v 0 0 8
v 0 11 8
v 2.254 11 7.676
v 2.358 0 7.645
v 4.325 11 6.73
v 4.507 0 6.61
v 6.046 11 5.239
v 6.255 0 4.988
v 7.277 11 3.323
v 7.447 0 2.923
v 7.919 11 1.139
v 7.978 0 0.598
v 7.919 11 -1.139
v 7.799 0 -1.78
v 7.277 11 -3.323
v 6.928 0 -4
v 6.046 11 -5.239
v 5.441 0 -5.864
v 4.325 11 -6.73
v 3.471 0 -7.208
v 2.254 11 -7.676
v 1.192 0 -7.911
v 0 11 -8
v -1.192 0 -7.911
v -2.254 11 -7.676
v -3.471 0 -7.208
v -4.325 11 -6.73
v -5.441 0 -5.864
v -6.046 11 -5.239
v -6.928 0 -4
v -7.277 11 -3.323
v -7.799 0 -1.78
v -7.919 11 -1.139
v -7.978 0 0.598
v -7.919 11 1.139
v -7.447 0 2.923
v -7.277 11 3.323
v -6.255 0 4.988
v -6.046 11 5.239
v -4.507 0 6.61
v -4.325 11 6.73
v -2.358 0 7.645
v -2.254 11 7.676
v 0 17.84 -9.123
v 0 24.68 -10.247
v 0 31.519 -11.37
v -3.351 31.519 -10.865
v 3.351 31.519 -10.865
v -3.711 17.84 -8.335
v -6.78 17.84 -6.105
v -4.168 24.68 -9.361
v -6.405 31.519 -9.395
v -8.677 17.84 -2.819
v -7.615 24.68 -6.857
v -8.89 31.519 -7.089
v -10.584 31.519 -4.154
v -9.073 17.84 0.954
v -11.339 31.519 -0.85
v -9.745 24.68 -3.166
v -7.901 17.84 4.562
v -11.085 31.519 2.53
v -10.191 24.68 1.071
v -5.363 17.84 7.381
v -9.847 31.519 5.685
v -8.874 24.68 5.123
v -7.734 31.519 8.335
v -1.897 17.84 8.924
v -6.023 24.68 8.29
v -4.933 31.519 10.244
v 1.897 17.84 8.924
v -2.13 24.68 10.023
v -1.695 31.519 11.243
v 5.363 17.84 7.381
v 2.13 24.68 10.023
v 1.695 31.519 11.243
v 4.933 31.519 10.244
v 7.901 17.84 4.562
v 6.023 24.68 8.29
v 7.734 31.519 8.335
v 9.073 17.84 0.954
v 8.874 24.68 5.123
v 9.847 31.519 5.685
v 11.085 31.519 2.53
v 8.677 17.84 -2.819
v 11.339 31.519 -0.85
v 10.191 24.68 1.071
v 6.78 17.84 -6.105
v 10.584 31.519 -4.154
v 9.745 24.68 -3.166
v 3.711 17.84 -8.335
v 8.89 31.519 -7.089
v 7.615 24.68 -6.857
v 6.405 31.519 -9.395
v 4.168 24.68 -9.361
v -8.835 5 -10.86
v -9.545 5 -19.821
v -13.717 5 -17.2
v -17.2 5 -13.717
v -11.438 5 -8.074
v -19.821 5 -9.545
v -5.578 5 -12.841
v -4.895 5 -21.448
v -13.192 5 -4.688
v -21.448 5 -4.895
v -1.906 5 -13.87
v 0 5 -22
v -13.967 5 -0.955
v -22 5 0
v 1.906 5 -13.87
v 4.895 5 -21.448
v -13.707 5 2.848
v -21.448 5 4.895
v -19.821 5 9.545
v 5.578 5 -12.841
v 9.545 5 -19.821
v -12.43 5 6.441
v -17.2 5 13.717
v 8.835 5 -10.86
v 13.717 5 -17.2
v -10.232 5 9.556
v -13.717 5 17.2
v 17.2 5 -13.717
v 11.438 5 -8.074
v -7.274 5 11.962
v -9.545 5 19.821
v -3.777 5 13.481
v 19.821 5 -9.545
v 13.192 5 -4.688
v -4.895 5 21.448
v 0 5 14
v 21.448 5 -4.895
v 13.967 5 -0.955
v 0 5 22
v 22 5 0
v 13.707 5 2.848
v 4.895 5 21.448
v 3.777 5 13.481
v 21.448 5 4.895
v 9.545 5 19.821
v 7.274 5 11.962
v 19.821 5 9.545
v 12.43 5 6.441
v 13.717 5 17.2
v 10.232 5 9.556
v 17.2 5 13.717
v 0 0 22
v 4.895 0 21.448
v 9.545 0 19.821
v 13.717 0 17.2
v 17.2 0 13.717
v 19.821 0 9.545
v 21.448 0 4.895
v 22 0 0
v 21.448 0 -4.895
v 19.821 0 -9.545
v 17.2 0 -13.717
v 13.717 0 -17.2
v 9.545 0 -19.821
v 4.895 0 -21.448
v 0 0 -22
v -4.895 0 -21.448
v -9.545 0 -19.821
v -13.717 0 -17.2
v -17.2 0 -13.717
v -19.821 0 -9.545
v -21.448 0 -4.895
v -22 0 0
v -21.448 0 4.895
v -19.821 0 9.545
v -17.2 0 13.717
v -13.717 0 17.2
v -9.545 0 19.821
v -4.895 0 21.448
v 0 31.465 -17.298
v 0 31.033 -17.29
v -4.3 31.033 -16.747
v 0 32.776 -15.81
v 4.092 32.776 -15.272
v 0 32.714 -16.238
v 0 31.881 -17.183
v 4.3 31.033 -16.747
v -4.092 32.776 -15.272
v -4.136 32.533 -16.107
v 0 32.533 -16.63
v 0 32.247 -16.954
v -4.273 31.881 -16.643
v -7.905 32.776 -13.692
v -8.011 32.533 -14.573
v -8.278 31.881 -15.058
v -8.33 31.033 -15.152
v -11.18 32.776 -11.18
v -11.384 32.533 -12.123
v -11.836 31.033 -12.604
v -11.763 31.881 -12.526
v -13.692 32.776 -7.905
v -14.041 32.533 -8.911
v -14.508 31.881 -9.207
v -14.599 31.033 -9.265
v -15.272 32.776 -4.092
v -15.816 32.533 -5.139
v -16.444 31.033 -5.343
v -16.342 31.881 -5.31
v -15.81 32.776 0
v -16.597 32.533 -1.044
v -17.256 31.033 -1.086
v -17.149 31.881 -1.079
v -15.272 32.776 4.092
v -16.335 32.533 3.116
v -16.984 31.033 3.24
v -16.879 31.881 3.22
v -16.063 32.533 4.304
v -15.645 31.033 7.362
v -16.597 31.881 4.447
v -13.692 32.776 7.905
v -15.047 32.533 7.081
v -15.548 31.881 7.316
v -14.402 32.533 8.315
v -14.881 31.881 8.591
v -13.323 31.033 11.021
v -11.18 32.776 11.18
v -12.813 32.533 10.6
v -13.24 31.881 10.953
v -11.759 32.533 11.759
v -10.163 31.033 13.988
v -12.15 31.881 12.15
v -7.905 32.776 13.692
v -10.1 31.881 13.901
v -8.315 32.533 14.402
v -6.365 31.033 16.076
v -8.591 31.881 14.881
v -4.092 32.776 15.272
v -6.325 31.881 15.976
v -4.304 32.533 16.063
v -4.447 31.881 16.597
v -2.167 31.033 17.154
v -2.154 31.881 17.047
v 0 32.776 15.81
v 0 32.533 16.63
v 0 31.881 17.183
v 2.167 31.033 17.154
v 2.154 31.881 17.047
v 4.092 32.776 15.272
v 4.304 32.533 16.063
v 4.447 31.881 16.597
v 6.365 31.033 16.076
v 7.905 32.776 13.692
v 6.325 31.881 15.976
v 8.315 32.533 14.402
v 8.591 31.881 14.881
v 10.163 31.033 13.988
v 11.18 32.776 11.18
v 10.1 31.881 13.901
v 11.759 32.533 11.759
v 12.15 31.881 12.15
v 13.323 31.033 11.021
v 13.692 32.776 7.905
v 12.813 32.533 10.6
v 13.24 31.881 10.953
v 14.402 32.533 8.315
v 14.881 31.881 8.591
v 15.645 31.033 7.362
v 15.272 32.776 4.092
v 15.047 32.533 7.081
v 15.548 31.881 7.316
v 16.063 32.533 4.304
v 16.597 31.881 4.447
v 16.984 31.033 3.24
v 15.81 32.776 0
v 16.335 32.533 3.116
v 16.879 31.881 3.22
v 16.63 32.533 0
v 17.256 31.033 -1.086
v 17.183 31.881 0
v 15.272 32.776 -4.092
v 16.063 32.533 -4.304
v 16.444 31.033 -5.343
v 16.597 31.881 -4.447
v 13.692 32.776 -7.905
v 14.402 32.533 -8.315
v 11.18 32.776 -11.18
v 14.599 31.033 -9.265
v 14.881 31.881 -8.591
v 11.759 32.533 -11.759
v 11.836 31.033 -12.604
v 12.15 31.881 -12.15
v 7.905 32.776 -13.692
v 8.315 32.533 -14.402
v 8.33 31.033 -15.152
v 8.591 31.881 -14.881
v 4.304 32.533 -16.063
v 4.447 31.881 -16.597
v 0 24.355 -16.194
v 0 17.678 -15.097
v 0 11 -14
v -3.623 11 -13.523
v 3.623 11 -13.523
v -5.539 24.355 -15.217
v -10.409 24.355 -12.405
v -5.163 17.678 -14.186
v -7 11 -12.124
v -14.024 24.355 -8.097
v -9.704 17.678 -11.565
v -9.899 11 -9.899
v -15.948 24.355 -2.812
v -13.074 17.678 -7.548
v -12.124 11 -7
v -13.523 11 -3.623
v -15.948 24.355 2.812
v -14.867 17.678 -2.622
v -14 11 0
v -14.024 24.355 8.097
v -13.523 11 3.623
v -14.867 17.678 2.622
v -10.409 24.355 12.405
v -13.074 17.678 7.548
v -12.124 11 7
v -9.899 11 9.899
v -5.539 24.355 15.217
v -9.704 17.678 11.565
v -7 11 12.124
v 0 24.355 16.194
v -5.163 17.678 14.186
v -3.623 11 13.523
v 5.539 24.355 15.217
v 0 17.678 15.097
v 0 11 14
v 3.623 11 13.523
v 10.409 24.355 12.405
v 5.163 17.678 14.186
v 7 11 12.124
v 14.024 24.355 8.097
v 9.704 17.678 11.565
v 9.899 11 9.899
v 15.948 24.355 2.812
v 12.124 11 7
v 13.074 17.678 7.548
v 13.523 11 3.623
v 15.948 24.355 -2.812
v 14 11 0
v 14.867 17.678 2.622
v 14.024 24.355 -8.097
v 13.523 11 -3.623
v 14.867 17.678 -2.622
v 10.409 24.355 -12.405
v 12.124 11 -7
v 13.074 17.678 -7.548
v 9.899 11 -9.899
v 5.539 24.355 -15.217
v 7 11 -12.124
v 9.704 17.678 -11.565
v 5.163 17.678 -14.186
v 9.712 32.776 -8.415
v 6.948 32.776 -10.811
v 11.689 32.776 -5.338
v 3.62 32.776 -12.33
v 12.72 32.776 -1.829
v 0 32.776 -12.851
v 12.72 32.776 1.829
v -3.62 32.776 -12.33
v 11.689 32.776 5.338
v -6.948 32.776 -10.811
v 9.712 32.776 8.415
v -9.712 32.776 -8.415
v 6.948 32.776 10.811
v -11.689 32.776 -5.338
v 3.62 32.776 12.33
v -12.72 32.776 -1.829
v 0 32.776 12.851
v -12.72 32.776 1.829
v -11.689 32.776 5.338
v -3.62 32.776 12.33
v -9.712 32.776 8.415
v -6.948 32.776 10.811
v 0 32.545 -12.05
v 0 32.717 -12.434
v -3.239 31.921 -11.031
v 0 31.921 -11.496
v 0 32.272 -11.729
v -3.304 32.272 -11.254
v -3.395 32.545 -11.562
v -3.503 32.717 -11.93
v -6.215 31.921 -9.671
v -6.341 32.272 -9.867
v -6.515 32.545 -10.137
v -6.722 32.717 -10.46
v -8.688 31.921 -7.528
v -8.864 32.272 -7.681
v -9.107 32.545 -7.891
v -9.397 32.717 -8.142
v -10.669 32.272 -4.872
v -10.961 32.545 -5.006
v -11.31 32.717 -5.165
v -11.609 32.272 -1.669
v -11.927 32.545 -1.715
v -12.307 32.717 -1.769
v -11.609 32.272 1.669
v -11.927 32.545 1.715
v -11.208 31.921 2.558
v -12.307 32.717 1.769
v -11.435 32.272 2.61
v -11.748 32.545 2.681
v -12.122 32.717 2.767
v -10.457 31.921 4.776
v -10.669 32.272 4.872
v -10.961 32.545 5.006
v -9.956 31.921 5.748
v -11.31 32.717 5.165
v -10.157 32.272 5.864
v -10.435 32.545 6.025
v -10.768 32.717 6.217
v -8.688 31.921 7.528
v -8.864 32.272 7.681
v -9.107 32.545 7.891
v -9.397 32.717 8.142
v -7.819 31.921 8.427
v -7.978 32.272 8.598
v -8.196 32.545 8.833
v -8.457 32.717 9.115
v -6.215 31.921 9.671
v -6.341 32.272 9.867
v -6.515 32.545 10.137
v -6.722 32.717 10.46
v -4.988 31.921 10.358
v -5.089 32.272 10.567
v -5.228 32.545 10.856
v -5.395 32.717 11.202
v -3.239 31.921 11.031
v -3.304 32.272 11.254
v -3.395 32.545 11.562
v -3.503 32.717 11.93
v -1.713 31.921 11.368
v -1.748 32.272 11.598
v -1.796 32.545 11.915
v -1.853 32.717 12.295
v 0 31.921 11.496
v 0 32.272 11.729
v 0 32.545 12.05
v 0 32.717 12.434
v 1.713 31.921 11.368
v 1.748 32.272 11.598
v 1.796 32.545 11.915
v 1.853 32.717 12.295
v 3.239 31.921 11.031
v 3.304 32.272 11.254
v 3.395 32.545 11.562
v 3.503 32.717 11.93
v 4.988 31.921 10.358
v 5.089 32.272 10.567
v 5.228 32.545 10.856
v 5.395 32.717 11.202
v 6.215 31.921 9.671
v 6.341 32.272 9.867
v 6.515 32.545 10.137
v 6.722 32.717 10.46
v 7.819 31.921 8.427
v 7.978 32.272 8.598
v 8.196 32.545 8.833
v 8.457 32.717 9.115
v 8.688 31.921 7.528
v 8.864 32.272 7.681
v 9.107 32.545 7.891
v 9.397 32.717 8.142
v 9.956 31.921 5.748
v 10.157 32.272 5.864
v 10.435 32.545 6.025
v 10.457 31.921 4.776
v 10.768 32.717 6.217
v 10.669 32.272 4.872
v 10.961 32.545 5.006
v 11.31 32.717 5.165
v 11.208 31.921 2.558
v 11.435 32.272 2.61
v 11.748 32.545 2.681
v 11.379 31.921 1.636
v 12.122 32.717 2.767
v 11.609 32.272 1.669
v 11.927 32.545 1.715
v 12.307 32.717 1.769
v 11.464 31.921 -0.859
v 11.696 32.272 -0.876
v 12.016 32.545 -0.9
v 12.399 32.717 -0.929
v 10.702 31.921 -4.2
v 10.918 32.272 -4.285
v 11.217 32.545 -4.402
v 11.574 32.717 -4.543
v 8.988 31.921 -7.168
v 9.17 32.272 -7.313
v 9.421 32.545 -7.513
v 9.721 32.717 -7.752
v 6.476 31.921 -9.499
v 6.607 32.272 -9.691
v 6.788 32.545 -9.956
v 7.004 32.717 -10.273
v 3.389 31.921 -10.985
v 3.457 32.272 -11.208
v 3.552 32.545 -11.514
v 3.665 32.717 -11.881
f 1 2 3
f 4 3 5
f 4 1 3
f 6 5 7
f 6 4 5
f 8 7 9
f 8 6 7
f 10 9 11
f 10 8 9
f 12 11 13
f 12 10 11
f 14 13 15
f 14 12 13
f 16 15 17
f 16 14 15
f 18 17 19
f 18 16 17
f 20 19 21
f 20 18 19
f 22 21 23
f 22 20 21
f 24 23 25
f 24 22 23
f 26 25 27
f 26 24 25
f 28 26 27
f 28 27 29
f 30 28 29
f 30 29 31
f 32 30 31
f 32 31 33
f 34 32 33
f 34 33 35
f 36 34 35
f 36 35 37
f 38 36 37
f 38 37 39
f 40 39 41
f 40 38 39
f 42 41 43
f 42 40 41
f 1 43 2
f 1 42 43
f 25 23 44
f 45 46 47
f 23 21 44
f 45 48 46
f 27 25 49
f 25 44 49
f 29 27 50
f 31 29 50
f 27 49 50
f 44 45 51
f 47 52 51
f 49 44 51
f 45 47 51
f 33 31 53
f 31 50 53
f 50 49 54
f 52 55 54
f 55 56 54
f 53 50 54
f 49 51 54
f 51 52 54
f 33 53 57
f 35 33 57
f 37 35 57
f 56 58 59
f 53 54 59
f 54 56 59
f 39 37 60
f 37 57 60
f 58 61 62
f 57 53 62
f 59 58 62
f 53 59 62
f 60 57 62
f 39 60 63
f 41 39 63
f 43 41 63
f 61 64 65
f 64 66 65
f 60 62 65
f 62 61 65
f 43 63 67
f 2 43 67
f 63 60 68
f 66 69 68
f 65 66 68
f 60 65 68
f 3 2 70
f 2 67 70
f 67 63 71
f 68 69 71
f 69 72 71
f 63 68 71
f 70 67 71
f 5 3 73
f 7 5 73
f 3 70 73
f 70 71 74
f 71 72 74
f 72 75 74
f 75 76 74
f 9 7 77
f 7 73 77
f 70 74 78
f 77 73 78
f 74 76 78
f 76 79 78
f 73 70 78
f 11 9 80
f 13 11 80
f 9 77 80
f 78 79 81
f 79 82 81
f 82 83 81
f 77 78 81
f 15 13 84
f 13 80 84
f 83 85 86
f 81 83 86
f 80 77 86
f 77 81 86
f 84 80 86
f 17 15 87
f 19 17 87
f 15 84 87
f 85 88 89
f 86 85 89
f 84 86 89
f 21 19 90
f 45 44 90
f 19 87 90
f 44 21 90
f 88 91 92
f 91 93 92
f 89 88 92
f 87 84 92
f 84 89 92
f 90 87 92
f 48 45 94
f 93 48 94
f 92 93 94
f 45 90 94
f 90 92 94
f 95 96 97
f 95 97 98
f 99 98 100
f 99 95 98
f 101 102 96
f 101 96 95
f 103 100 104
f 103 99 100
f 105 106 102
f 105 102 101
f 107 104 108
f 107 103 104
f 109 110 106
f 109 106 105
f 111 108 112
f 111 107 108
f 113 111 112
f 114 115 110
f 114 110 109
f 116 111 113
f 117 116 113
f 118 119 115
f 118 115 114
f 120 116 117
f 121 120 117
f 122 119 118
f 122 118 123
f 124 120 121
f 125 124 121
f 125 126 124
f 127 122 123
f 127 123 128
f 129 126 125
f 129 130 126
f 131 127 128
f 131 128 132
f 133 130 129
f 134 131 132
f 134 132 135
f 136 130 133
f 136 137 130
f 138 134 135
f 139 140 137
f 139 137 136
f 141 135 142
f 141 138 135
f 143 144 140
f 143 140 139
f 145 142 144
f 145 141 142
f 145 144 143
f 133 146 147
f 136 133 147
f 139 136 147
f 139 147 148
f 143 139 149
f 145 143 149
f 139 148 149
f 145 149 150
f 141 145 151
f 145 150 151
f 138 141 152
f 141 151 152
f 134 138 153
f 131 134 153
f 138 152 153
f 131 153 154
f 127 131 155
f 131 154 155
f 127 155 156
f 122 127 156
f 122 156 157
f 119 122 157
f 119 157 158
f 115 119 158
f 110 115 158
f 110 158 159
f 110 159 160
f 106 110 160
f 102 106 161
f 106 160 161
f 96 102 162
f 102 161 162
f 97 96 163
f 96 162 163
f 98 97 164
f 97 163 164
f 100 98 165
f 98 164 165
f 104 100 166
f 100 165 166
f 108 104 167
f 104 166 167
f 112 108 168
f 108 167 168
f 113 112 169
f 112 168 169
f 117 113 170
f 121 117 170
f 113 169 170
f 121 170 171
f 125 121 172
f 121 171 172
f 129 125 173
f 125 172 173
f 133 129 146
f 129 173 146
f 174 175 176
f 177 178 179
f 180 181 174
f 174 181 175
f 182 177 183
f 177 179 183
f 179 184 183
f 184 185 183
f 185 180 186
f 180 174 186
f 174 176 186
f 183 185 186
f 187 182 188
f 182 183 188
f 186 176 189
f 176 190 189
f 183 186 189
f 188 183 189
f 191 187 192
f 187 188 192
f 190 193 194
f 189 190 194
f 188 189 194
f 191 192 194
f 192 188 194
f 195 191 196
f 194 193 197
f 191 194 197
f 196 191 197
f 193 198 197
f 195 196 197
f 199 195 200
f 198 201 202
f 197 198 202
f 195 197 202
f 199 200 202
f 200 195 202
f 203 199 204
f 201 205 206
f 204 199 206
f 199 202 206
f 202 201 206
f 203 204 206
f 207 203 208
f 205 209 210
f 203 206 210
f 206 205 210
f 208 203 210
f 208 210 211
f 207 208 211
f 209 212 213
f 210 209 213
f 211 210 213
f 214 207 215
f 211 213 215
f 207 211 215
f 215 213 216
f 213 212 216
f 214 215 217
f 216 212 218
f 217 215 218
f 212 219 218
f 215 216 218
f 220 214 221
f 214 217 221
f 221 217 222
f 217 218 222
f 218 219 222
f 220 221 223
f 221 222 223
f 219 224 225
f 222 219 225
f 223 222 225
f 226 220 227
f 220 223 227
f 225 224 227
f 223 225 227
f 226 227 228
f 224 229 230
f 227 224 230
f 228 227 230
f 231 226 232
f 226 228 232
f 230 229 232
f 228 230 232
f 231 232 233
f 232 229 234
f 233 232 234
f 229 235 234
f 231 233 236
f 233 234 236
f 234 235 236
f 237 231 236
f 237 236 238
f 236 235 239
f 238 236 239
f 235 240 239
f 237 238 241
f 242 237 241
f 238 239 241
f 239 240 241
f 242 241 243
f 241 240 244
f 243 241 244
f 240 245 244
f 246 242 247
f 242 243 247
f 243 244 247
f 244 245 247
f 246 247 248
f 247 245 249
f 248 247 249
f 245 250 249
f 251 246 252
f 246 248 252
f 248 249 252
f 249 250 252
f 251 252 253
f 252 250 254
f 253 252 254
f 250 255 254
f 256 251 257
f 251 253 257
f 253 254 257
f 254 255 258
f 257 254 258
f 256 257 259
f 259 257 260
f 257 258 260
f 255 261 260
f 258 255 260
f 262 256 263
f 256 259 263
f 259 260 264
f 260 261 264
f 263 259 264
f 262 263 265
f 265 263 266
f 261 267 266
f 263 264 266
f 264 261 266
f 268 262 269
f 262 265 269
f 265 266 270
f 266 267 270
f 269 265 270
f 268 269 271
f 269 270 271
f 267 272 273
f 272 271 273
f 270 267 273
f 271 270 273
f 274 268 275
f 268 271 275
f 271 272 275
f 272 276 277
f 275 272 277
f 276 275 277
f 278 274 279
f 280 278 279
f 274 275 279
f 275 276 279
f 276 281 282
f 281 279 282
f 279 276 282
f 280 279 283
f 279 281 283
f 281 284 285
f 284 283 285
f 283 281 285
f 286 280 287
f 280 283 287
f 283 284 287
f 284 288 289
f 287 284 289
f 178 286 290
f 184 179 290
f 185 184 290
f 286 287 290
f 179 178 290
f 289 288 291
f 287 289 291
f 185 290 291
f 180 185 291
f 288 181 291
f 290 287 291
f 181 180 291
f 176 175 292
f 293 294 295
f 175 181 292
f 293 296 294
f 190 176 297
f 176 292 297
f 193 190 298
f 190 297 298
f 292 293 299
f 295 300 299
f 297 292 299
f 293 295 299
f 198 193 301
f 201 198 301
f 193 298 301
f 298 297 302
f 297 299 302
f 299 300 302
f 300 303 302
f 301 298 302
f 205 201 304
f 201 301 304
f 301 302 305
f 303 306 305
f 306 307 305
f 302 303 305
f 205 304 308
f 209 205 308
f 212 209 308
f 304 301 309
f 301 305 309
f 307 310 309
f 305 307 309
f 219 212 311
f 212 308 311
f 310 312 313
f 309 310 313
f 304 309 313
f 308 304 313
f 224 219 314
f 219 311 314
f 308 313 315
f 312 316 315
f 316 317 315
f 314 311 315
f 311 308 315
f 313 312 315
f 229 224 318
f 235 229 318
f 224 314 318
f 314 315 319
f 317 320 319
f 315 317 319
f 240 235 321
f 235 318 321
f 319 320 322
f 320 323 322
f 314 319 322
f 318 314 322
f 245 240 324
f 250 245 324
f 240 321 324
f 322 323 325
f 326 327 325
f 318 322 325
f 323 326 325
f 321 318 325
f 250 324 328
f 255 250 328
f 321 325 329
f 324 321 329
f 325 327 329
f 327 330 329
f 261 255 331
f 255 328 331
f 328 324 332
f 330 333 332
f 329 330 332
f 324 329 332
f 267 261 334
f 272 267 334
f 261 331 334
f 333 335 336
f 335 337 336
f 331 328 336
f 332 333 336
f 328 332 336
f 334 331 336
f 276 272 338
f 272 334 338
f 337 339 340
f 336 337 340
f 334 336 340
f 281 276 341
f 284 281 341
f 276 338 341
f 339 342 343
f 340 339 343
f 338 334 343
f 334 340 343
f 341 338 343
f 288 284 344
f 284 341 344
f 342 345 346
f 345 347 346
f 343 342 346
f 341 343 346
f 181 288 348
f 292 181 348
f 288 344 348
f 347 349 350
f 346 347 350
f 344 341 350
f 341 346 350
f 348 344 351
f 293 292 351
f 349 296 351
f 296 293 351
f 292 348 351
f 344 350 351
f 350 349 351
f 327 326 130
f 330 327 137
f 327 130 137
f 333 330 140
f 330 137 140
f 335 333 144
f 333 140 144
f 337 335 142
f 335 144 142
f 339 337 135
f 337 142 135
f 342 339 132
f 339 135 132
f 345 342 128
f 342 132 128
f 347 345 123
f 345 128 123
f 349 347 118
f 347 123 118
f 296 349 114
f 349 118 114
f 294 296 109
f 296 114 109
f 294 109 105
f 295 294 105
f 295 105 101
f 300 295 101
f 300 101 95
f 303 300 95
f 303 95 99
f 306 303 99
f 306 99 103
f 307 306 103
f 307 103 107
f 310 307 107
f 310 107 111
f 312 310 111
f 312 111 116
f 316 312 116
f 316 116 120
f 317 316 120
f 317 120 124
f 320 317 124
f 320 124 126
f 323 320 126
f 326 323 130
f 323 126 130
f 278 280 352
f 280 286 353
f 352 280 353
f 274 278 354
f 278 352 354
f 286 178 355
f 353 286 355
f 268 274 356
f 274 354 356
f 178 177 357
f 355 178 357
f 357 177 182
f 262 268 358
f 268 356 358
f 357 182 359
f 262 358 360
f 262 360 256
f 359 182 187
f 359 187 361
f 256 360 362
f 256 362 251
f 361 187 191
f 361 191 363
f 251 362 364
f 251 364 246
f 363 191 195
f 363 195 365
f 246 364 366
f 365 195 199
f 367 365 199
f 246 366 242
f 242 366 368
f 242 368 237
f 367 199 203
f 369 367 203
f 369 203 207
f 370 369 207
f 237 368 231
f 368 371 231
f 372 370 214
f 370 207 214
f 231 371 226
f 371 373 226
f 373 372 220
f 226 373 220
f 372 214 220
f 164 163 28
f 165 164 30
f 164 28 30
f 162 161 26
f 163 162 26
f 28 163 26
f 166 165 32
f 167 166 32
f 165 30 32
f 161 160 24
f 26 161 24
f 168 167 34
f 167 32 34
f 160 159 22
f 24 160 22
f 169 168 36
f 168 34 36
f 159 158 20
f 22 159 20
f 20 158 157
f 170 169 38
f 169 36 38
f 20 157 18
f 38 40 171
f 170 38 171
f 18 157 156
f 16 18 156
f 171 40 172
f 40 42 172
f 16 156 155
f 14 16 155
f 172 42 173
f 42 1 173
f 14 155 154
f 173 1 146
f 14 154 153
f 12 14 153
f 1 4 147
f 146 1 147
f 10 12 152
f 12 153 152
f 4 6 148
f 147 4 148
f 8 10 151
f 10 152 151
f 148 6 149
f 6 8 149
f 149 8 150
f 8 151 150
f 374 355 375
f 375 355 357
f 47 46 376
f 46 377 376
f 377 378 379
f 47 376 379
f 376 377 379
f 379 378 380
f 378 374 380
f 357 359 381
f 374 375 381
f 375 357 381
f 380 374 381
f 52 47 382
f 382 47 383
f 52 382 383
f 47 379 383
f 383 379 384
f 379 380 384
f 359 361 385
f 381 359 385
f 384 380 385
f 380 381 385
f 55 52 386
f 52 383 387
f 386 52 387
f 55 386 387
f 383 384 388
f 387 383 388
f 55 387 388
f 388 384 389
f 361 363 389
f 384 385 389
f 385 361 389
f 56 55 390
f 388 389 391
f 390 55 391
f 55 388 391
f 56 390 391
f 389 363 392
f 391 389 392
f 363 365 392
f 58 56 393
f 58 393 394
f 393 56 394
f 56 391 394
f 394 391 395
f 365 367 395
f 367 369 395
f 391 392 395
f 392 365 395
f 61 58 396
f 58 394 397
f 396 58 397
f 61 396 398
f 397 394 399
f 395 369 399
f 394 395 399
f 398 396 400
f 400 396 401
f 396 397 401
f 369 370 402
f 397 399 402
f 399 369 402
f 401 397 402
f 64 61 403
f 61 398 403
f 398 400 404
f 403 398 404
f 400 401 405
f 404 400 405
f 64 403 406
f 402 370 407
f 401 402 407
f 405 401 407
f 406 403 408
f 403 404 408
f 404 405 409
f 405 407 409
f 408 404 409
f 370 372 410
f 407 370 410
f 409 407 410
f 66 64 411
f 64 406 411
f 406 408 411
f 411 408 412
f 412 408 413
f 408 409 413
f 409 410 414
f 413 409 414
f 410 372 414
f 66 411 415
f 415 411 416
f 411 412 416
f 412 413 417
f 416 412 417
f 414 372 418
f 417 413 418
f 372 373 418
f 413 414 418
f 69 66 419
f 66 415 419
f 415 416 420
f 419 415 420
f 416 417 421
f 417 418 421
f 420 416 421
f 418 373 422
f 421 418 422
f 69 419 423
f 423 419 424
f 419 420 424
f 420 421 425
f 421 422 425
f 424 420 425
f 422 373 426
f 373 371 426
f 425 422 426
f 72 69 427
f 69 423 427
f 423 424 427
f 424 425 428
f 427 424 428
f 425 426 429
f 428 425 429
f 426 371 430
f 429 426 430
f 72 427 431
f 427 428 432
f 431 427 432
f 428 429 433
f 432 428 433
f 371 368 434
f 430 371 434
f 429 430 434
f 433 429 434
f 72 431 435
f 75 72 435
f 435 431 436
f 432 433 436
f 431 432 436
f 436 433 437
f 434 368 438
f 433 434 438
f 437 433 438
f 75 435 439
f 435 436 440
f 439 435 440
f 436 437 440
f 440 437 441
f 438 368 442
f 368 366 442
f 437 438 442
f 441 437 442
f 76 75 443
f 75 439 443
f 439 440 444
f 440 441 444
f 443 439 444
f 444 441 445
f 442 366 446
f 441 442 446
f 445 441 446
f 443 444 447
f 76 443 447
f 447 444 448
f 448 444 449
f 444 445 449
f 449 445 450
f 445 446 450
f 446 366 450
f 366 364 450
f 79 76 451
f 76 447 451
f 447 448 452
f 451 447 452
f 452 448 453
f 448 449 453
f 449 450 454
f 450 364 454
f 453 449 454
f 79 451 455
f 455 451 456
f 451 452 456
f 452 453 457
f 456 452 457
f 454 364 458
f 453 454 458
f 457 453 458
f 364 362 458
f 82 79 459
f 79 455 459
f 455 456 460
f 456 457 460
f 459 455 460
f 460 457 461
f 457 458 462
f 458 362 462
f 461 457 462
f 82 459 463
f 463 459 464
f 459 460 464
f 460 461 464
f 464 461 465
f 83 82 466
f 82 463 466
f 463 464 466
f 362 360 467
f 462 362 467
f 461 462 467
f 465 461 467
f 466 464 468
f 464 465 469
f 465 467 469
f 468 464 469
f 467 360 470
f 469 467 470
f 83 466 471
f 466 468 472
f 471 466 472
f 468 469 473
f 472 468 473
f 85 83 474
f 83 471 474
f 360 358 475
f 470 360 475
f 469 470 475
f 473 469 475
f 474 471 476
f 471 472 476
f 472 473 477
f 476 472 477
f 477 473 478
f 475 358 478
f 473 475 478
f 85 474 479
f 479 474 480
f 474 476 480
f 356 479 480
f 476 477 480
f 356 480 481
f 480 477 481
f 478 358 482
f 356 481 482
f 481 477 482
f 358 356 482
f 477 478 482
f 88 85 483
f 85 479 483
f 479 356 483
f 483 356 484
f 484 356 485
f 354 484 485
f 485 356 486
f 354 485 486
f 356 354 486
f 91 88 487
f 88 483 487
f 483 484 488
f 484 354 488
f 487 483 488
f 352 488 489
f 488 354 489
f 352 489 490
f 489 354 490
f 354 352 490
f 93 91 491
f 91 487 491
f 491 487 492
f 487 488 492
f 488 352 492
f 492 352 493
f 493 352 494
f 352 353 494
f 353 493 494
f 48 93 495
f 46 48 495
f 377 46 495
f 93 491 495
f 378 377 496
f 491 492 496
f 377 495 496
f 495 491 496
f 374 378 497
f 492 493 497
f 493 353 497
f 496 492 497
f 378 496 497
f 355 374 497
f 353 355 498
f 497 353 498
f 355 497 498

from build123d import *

# Parameters (mm, degrees)
SKETCH1_R           = 22
SKETCH1_R_2         = 8
BOSS_EXTRUDE1_DEPTH = 5
SKETCH2_R           = 14
SKETCH2_R_2         = 8
BOSS_EXTRUDE2_DEPTH = 6


with BuildPart() as part:
    # Sketch1 → Boss-Extrude1 (new body)
    with BuildSketch(Plane(origin=(0, 0, 0), x_dir=(1, 0, 0), z_dir=(0, 1, 0))):
        with Locations(Location((0, 0, 0), (0, 0, 270))):
            Circle(SKETCH1_R)
        with Locations(Location((0, 0, 0), (0, 0, 270))):
            Circle(SKETCH1_R_2, mode=Mode.SUBTRACT)
    extrude(amount=BOSS_EXTRUDE1_DEPTH)

    # Sketch2 → Boss-Extrude2 (add)
    with BuildSketch(Plane(origin=(0, 5, 0), x_dir=(1, 0, 0), z_dir=(0, 1, 0))):
        with Locations(Location((0, 0, 0), (0, 0, 270))):
            Circle(SKETCH2_R)
        with Locations(Location((0, 0, 0), (0, 0, 270))):
            Circle(SKETCH2_R_2, mode=Mode.SUBTRACT)
    extrude(amount=BOSS_EXTRUDE2_DEPTH)

    # Sketch3 → Revolve1 (revolve)
    with BuildSketch(Plane.XY, mode=Mode.PRIVATE) as revolve1_sk:
        with BuildLine():
            Line((8, 11), (11.370346923, 31.519425266))
            ThreePointArc((11.370346923, 31.519425266), (11.879606474, 32.419695227), (12.850513419, 32.776305659))
            Line((12.850513419, 32.776305659), (15.810314893, 32.776305659))
            ThreePointArc((15.810314893, 32.776305659), (16.953704462, 32.247212604), (17.29048139, 31.033186053))
            Line((17.29048139, 31.033186053), (14, 11))
            Line((14, 11), (8, 11))
        make_face()
    revolve(revolve1_sk.sketch.rotate(Axis((0, 0, 0), (0, 1, 0)), 90), axis=Axis((0, 0, 0), (0, 1, 0)))


solid = part.part
